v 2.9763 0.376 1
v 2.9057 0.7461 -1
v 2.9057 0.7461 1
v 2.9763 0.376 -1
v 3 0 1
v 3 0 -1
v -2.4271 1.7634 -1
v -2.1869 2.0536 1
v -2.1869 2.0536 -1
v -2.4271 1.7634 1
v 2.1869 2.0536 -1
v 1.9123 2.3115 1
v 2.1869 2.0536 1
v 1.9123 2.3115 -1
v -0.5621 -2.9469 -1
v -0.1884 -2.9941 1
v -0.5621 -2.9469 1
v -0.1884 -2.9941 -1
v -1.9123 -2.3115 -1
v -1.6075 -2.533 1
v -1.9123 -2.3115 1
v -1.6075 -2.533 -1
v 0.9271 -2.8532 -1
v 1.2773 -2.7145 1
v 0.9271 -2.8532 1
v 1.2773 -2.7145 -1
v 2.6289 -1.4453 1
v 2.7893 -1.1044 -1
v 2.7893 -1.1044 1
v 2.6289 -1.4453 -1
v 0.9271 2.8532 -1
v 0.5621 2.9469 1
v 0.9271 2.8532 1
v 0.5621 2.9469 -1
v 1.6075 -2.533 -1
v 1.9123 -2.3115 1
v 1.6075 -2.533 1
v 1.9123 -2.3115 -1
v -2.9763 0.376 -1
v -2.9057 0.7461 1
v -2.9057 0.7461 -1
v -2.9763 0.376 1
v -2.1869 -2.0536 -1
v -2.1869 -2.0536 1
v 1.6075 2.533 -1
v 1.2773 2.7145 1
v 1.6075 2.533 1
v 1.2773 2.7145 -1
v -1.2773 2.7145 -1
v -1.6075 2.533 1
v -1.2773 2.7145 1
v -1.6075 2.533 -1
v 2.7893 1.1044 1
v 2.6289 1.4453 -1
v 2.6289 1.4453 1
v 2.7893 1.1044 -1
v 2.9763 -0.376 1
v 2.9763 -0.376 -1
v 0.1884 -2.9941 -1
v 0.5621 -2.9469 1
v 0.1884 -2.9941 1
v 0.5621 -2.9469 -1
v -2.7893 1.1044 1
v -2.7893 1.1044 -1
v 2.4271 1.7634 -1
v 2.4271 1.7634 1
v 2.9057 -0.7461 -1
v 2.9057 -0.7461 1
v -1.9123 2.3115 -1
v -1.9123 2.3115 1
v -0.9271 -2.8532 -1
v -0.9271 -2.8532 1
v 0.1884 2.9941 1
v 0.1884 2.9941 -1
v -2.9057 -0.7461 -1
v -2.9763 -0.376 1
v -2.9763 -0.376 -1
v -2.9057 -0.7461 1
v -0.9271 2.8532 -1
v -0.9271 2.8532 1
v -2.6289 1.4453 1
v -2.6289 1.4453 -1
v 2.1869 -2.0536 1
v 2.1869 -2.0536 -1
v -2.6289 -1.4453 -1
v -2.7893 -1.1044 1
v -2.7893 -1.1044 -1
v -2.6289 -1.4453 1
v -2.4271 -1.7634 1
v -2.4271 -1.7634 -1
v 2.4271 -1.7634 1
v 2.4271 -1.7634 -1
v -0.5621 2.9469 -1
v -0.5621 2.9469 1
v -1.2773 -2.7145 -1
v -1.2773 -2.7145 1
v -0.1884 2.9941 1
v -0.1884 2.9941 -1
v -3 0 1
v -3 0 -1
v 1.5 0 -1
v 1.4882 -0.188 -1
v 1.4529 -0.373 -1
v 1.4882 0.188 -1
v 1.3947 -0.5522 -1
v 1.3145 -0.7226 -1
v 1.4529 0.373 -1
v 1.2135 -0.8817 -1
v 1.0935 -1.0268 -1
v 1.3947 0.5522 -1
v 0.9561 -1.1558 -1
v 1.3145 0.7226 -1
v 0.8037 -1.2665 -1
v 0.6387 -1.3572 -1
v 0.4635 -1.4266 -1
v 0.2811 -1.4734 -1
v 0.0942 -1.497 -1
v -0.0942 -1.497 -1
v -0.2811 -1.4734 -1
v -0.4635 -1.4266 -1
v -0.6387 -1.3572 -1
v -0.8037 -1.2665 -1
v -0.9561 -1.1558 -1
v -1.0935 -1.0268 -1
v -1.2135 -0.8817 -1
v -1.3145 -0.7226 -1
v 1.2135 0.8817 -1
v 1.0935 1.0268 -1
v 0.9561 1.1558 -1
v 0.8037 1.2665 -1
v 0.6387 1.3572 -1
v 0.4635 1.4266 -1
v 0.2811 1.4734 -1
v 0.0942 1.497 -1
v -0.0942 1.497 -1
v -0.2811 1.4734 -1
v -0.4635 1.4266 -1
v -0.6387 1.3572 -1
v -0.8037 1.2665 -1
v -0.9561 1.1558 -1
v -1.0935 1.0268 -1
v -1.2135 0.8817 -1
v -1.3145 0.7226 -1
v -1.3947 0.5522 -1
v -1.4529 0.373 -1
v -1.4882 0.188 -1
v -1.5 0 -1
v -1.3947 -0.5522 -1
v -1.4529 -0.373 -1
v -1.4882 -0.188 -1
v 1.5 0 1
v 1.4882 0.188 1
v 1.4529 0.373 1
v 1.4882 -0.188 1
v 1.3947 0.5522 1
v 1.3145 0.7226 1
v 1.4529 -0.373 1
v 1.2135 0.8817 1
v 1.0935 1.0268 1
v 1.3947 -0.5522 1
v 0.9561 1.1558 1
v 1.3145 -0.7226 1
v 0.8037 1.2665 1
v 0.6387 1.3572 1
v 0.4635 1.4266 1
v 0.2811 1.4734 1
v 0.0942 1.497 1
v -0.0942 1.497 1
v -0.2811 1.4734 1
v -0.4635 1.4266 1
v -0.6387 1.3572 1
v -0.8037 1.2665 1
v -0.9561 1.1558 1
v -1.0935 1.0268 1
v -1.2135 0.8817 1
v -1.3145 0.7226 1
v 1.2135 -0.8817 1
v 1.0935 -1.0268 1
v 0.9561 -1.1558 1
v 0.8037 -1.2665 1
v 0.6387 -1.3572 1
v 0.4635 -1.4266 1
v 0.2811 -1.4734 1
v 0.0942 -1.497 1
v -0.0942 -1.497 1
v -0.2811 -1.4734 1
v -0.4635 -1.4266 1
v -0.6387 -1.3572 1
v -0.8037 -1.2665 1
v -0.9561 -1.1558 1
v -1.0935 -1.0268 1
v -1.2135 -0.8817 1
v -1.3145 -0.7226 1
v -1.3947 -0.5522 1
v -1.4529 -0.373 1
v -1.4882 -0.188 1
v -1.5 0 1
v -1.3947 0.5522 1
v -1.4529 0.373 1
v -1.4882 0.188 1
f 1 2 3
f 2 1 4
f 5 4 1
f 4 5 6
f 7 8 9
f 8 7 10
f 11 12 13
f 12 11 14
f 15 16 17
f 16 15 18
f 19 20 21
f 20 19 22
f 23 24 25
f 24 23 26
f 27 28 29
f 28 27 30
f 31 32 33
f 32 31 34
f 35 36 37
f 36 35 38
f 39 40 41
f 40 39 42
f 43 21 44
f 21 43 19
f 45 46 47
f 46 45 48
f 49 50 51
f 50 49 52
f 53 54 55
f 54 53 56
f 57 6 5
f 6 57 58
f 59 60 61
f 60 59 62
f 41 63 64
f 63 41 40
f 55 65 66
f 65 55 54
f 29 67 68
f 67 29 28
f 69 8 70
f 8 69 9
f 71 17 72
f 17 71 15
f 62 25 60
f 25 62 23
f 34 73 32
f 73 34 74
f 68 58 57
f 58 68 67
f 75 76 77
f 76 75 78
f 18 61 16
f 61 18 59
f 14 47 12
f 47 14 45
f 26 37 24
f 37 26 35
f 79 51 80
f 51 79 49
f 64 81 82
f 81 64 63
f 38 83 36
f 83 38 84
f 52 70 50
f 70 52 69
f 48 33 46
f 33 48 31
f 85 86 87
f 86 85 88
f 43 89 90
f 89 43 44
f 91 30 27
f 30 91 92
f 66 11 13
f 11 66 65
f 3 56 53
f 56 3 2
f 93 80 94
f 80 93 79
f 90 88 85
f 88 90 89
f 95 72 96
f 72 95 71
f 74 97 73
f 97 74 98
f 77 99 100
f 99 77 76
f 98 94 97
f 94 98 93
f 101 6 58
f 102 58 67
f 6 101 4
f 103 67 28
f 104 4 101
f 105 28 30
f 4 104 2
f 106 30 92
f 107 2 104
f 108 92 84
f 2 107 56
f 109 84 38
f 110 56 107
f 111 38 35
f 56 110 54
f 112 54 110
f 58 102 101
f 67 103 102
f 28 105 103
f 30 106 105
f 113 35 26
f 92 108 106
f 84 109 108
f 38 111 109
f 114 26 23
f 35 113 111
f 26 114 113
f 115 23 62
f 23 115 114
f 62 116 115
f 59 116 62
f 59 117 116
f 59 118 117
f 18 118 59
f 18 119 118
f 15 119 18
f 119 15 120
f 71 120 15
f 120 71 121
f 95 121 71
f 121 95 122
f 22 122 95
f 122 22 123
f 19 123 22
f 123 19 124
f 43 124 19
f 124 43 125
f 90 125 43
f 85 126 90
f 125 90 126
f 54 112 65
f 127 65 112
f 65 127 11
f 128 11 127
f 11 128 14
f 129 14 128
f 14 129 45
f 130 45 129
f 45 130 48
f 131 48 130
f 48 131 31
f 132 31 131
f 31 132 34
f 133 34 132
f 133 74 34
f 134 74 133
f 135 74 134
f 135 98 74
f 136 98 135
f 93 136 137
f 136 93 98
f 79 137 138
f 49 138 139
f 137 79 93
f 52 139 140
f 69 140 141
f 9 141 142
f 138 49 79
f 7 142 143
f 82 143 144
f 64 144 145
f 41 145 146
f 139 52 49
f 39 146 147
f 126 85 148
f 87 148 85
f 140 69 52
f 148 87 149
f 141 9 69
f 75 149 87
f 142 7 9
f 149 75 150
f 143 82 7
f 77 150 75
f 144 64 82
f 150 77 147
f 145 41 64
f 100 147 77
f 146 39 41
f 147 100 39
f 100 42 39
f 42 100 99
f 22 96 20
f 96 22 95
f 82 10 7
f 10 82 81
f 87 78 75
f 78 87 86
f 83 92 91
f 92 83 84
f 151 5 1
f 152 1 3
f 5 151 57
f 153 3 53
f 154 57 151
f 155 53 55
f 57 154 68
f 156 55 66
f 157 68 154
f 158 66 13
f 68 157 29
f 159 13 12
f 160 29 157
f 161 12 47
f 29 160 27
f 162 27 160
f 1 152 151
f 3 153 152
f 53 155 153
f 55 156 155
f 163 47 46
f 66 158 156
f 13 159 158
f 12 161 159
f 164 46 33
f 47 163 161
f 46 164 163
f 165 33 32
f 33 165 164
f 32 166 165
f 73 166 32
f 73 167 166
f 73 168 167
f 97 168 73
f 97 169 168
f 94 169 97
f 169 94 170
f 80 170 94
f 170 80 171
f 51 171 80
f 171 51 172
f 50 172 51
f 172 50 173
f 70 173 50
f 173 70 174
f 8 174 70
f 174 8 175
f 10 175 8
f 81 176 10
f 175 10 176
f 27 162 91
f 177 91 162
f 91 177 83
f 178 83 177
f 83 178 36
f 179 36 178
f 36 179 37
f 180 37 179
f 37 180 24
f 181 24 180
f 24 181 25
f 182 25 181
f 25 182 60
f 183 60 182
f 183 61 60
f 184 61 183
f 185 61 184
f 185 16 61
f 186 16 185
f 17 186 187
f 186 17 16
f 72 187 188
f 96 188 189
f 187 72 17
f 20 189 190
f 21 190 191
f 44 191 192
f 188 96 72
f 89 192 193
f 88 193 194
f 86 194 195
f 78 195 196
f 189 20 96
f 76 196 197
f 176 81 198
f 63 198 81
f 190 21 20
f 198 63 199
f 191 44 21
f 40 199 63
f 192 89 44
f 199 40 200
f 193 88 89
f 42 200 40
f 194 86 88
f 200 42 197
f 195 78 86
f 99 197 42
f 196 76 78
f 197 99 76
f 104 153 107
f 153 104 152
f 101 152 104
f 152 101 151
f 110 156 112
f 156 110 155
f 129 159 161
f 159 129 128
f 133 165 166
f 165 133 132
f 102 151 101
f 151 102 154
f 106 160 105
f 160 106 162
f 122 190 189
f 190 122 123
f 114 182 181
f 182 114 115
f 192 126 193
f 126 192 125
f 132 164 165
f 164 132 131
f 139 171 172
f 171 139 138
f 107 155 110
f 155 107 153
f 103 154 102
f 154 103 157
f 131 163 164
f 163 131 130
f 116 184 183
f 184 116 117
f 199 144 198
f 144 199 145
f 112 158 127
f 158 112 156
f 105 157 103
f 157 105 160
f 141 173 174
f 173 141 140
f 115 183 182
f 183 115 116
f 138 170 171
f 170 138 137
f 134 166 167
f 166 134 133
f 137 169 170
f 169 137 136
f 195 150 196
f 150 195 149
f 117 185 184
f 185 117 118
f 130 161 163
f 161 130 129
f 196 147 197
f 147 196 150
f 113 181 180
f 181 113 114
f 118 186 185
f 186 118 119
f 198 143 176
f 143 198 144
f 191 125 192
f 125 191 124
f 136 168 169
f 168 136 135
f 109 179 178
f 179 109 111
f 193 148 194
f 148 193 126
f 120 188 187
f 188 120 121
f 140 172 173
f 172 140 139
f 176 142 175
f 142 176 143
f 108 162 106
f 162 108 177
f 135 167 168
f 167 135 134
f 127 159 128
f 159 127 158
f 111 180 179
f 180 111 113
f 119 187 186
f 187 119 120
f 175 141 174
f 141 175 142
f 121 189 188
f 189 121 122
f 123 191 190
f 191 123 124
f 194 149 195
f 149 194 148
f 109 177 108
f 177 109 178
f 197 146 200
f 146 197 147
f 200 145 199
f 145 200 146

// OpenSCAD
$fn = 50;


difference() {
	union() {
		translate(v = [0, 0, -1.0000000000]) {
			cylinder(h = 2, r = 3.0000000000);
		}
	}
	union() {
		translate(v = [0, 0, -100.0000000000]) {
			cylinder(h = 200, r = 1.5000000000);
		}
	}
}
